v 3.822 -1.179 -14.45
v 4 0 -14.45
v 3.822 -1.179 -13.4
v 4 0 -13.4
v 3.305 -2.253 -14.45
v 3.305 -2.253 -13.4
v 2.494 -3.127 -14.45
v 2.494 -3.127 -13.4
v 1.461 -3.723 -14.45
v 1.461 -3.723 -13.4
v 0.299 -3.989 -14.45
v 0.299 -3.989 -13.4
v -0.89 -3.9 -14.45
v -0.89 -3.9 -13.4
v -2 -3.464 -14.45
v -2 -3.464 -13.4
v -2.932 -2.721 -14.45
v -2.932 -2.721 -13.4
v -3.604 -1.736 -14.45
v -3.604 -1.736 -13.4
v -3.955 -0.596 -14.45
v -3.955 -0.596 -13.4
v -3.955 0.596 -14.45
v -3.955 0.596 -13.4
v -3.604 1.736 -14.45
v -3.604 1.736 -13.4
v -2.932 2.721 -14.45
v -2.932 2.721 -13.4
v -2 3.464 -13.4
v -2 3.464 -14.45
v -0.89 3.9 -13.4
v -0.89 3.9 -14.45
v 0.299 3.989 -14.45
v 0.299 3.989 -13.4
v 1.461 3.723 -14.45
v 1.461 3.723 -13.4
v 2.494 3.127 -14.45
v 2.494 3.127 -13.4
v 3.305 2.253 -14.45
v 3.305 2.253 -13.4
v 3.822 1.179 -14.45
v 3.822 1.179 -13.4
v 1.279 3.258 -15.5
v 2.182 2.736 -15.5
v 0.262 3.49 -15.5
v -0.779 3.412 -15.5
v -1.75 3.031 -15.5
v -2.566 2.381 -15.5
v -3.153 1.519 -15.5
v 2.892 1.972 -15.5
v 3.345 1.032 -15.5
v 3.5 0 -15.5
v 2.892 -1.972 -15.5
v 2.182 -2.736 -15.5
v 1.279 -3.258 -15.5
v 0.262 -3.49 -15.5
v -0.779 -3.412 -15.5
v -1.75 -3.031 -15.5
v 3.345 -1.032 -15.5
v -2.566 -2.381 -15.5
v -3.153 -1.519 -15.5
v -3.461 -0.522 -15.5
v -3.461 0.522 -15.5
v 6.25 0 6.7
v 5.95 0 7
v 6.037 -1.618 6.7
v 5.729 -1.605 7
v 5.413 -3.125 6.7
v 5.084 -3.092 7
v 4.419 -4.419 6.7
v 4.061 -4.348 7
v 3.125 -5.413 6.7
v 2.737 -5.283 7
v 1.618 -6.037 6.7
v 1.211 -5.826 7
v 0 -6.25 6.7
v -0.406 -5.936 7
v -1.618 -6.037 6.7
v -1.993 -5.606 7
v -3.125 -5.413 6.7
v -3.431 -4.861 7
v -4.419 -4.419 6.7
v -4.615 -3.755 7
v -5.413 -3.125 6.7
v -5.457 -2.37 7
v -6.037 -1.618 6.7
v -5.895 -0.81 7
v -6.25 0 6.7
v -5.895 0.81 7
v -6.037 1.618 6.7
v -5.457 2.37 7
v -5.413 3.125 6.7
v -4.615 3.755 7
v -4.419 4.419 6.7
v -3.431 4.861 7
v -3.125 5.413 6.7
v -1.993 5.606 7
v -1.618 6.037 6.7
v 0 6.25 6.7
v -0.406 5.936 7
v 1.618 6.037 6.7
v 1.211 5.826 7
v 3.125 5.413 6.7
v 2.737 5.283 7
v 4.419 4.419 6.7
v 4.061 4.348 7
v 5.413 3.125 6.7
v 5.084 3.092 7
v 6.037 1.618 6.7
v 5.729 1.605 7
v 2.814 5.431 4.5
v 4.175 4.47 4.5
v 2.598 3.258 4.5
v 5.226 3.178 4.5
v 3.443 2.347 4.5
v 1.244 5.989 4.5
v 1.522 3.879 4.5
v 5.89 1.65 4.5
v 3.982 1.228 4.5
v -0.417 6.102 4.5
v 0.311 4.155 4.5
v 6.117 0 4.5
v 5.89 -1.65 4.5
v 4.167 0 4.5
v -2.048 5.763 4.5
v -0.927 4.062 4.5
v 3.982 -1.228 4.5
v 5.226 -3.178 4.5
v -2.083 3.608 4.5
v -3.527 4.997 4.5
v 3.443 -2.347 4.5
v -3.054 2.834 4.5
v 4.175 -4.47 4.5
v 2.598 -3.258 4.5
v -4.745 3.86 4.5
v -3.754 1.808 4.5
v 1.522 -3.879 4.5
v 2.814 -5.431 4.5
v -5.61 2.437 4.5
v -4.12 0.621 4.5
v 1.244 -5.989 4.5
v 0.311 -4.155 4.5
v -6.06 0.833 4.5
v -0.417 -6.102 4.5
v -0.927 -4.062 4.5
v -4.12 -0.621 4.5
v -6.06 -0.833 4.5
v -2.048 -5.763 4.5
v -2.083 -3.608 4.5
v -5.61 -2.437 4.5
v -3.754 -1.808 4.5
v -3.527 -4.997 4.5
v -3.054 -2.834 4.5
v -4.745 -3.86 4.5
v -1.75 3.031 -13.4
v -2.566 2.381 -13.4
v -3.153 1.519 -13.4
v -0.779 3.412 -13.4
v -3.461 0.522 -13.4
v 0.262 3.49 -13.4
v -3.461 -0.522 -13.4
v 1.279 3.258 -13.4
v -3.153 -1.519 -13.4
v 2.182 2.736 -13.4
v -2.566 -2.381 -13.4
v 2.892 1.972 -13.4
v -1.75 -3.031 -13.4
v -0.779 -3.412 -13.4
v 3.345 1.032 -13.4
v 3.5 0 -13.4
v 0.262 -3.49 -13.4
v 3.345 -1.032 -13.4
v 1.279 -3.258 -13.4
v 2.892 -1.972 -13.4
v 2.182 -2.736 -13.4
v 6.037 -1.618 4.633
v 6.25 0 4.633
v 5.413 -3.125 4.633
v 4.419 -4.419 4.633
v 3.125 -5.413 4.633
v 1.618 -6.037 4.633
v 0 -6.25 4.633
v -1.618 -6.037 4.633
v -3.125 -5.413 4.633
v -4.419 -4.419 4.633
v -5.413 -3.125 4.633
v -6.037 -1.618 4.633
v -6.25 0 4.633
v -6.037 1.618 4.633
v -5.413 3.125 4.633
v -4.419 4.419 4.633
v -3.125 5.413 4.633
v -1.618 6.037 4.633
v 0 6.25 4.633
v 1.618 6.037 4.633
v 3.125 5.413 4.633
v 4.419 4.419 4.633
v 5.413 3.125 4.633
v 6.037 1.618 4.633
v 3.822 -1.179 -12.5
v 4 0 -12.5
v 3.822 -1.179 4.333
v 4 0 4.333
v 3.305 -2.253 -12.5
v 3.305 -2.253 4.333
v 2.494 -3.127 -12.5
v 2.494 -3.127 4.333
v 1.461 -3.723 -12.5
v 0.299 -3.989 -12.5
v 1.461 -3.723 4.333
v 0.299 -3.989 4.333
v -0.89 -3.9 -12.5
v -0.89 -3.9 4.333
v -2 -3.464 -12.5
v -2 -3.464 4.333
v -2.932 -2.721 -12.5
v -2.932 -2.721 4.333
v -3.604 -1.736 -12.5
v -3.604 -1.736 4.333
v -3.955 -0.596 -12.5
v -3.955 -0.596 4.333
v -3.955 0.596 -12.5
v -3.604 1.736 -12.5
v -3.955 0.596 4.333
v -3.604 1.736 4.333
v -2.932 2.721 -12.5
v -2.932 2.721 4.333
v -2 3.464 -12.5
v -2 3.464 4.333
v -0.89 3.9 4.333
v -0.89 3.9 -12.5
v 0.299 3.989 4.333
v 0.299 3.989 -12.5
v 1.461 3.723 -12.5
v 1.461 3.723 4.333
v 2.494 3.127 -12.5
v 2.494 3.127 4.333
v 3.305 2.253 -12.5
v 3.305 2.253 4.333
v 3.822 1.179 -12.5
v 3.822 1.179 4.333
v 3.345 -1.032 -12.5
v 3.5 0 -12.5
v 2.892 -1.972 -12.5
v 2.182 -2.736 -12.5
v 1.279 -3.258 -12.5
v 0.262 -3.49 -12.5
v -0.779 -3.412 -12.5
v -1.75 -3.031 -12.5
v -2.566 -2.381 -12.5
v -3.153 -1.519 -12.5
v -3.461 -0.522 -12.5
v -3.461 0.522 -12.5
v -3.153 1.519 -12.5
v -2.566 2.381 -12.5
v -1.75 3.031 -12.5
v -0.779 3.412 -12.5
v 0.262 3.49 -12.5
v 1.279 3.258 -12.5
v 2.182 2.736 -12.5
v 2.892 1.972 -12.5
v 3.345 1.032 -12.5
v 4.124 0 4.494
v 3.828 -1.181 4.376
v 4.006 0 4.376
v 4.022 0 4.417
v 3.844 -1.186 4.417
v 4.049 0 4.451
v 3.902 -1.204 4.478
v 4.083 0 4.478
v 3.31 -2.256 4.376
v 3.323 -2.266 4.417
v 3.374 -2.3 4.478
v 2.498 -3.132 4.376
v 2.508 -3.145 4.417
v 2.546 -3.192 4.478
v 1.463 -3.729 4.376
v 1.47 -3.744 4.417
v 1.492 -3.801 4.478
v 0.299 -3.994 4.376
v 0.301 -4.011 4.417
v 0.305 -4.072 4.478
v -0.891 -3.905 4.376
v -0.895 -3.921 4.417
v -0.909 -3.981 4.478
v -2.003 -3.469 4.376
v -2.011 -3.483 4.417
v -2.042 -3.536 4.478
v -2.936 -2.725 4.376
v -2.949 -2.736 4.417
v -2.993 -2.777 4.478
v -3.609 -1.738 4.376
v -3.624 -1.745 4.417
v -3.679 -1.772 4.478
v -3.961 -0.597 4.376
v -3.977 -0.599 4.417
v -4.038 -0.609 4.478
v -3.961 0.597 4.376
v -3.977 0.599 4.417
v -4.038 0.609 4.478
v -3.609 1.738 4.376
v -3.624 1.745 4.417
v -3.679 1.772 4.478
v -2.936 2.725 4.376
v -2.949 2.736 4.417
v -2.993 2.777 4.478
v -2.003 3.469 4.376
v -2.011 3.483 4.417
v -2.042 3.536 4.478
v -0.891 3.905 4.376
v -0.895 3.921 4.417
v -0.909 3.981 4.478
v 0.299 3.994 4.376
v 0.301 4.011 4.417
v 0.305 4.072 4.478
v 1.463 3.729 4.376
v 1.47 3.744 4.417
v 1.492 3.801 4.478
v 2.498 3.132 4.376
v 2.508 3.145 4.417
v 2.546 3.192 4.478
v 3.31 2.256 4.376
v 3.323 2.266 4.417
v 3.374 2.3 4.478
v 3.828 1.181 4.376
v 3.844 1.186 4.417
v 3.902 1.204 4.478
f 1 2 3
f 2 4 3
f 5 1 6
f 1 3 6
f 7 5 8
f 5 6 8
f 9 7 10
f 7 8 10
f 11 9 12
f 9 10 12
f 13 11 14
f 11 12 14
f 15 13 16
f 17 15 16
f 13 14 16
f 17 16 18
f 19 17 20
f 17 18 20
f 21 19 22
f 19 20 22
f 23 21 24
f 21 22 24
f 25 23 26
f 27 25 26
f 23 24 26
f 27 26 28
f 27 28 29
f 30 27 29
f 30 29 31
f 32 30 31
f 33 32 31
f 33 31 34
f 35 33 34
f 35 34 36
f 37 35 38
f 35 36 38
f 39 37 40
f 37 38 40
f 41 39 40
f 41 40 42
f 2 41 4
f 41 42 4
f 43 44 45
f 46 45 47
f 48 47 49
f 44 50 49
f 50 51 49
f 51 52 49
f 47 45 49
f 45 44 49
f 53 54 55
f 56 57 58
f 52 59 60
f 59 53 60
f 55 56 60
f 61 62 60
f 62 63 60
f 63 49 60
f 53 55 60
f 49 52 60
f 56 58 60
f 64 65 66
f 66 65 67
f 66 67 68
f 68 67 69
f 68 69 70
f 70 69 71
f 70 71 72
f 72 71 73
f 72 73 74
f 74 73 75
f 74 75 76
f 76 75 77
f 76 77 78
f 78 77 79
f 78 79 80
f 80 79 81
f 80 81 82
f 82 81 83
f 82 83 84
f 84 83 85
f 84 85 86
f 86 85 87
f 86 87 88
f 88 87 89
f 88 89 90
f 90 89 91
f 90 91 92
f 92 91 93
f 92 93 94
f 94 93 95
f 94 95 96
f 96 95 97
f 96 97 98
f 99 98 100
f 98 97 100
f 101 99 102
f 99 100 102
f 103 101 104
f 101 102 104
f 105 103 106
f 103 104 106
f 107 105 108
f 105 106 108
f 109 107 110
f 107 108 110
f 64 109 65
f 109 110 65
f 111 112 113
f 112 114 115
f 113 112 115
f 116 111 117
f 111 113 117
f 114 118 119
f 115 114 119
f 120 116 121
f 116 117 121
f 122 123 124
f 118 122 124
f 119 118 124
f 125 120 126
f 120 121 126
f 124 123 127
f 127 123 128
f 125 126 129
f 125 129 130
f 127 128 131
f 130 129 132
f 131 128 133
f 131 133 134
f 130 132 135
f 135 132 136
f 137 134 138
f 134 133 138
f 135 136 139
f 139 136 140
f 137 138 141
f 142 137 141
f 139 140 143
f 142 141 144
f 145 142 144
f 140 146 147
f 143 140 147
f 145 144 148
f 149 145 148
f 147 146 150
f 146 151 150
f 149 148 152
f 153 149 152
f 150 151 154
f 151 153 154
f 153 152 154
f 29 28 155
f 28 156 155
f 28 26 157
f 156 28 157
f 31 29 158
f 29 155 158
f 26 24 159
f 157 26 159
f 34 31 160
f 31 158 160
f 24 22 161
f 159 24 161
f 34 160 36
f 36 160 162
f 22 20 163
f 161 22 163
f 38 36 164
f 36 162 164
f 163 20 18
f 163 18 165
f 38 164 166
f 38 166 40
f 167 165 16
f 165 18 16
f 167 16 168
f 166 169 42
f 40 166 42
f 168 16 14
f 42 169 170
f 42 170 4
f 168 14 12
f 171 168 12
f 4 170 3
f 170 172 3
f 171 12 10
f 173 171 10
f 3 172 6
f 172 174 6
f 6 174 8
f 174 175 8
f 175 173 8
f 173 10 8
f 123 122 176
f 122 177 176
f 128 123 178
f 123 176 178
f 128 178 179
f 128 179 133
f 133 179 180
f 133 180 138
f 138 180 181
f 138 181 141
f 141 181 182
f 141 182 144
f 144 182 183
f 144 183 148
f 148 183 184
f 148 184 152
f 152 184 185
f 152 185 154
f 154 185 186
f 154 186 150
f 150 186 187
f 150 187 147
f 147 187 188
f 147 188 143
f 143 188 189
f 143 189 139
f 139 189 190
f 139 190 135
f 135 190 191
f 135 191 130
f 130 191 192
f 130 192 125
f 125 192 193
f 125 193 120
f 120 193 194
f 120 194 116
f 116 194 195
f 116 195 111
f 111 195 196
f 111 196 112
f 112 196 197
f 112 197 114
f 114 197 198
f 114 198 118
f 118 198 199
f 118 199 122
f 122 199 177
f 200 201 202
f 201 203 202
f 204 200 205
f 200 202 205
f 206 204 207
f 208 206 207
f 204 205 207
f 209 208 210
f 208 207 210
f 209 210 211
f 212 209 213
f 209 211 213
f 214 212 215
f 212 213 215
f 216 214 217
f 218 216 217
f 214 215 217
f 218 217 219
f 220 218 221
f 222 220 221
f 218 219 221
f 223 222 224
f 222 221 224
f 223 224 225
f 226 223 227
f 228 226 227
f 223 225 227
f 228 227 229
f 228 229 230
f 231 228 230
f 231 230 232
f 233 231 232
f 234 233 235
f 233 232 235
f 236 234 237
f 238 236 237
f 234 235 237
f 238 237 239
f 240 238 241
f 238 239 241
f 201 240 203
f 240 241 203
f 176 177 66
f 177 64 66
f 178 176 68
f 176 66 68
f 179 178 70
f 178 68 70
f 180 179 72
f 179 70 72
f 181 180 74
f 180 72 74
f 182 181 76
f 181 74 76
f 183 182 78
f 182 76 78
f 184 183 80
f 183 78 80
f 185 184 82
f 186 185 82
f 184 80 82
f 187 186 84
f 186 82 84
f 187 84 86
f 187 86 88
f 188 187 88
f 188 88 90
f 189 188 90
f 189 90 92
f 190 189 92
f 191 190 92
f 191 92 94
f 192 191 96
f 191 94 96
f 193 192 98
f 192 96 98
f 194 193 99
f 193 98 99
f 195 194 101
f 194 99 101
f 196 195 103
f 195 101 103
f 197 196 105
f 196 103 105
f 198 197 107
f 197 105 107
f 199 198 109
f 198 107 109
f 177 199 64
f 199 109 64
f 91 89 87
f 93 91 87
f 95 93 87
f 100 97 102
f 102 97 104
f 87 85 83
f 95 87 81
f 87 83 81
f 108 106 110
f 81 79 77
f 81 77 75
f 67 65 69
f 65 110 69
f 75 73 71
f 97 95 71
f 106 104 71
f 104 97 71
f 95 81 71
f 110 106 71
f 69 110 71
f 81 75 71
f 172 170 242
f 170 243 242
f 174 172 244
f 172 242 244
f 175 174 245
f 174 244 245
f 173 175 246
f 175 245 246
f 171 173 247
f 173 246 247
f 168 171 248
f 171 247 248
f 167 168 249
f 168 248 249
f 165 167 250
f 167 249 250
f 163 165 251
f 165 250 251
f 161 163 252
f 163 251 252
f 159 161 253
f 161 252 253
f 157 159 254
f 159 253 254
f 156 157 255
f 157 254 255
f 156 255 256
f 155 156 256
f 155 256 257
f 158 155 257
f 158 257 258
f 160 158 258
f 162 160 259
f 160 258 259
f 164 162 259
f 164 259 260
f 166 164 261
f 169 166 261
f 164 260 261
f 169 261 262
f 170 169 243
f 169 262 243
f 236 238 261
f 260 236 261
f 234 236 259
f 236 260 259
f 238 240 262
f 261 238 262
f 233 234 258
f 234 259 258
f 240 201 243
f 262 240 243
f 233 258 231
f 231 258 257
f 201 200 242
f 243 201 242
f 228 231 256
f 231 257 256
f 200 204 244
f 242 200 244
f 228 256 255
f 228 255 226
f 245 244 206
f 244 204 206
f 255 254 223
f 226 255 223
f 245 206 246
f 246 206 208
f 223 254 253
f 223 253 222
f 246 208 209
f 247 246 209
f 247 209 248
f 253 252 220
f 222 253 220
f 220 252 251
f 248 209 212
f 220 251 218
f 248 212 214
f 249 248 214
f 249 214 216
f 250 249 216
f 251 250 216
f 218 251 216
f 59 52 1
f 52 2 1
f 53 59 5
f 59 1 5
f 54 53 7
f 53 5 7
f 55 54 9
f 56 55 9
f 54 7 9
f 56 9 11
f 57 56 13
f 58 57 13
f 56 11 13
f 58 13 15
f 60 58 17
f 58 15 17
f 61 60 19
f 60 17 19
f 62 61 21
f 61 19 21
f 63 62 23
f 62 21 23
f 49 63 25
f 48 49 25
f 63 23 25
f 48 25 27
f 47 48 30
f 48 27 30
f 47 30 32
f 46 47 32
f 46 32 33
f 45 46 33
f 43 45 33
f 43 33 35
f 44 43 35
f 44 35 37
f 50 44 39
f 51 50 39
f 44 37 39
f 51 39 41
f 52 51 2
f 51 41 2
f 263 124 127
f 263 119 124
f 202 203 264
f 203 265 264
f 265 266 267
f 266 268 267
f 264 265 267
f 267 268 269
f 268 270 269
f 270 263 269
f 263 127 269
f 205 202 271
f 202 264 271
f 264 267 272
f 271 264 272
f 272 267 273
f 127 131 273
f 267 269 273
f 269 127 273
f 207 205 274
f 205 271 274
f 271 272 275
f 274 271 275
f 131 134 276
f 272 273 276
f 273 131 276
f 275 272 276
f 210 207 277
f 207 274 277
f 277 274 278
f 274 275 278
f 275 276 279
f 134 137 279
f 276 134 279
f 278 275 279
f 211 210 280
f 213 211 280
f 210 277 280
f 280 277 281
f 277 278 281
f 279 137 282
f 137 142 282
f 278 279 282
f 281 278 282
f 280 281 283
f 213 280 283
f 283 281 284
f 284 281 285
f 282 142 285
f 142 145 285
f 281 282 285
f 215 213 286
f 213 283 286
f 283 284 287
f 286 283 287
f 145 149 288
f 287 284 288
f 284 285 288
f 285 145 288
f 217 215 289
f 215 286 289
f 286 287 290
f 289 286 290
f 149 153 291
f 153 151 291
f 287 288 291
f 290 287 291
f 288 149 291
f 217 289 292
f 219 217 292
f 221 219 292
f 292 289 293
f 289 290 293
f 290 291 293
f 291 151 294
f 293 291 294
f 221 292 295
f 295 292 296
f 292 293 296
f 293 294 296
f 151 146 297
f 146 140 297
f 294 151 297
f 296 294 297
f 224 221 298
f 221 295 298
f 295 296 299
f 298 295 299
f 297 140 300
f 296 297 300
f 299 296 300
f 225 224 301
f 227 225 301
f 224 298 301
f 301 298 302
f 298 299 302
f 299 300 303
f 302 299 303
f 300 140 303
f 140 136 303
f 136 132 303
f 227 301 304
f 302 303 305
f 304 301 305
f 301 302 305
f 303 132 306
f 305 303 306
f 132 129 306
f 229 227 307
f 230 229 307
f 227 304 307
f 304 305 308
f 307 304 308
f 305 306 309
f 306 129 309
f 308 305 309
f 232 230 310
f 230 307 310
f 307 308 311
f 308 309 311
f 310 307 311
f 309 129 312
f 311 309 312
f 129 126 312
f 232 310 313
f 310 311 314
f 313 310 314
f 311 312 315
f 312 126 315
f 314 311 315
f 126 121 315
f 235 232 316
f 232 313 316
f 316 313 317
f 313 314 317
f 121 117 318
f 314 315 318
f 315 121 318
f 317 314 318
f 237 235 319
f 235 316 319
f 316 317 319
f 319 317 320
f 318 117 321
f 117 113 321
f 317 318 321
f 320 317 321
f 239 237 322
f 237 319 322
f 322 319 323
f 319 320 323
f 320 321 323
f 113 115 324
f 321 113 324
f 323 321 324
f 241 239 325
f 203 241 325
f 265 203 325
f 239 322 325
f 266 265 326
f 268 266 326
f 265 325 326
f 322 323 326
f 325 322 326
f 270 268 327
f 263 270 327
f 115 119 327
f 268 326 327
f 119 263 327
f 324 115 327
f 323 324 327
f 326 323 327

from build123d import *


with BuildPart() as part:
    # 草图3 → 旋转1 (revolve)
    with BuildSketch(Plane(origin=(0, 0, 0), x_dir=(0, 0, -1), z_dir=(1, 0, 0)), mode=Mode.PRIVATE) as revolve_1_sk:
        with BuildLine():
            Line((12.5, 0), (15.5, 0))
            Line((15.5, 0), (15.5, 3.5))
            Line((15.5, 3.5), (14.45, 4))
            Line((14.45, 4), (13.4, 4))
            Line((13.4, 4), (13.4, 3.5))
            Line((13.4, 3.5), (12.5, 3.5))
            Line((12.5, 3.5), (12.5, 4))
            Line((12.5, 4), (0, 4))
            Line((0, 4), (-4.333333333, 4))
            ThreePointArc((-4.333333333, 4), (-4.451184464, 4.048815536), (-4.5, 4.166666667))
            Line((-4.5, 4.166666667), (-4.5, 6.116666667))
            Line((-4.5, 6.116666667), (-4.633333333, 6.25))
            Line((-4.633333333, 6.25), (-6.7, 6.25))
            Line((-6.7, 6.25), (-7, 5.95))
            Line((-7, 5.95), (-7, 0))
            Line((-7, 0), (12.5, 0))
        make_face()
    revolve(revolve_1_sk.sketch.rotate(Axis((0, 0, 7), (0, 0, -1)), 90), axis=Axis((0, 0, 7), (0, 0, -1)))


solid = part.part
